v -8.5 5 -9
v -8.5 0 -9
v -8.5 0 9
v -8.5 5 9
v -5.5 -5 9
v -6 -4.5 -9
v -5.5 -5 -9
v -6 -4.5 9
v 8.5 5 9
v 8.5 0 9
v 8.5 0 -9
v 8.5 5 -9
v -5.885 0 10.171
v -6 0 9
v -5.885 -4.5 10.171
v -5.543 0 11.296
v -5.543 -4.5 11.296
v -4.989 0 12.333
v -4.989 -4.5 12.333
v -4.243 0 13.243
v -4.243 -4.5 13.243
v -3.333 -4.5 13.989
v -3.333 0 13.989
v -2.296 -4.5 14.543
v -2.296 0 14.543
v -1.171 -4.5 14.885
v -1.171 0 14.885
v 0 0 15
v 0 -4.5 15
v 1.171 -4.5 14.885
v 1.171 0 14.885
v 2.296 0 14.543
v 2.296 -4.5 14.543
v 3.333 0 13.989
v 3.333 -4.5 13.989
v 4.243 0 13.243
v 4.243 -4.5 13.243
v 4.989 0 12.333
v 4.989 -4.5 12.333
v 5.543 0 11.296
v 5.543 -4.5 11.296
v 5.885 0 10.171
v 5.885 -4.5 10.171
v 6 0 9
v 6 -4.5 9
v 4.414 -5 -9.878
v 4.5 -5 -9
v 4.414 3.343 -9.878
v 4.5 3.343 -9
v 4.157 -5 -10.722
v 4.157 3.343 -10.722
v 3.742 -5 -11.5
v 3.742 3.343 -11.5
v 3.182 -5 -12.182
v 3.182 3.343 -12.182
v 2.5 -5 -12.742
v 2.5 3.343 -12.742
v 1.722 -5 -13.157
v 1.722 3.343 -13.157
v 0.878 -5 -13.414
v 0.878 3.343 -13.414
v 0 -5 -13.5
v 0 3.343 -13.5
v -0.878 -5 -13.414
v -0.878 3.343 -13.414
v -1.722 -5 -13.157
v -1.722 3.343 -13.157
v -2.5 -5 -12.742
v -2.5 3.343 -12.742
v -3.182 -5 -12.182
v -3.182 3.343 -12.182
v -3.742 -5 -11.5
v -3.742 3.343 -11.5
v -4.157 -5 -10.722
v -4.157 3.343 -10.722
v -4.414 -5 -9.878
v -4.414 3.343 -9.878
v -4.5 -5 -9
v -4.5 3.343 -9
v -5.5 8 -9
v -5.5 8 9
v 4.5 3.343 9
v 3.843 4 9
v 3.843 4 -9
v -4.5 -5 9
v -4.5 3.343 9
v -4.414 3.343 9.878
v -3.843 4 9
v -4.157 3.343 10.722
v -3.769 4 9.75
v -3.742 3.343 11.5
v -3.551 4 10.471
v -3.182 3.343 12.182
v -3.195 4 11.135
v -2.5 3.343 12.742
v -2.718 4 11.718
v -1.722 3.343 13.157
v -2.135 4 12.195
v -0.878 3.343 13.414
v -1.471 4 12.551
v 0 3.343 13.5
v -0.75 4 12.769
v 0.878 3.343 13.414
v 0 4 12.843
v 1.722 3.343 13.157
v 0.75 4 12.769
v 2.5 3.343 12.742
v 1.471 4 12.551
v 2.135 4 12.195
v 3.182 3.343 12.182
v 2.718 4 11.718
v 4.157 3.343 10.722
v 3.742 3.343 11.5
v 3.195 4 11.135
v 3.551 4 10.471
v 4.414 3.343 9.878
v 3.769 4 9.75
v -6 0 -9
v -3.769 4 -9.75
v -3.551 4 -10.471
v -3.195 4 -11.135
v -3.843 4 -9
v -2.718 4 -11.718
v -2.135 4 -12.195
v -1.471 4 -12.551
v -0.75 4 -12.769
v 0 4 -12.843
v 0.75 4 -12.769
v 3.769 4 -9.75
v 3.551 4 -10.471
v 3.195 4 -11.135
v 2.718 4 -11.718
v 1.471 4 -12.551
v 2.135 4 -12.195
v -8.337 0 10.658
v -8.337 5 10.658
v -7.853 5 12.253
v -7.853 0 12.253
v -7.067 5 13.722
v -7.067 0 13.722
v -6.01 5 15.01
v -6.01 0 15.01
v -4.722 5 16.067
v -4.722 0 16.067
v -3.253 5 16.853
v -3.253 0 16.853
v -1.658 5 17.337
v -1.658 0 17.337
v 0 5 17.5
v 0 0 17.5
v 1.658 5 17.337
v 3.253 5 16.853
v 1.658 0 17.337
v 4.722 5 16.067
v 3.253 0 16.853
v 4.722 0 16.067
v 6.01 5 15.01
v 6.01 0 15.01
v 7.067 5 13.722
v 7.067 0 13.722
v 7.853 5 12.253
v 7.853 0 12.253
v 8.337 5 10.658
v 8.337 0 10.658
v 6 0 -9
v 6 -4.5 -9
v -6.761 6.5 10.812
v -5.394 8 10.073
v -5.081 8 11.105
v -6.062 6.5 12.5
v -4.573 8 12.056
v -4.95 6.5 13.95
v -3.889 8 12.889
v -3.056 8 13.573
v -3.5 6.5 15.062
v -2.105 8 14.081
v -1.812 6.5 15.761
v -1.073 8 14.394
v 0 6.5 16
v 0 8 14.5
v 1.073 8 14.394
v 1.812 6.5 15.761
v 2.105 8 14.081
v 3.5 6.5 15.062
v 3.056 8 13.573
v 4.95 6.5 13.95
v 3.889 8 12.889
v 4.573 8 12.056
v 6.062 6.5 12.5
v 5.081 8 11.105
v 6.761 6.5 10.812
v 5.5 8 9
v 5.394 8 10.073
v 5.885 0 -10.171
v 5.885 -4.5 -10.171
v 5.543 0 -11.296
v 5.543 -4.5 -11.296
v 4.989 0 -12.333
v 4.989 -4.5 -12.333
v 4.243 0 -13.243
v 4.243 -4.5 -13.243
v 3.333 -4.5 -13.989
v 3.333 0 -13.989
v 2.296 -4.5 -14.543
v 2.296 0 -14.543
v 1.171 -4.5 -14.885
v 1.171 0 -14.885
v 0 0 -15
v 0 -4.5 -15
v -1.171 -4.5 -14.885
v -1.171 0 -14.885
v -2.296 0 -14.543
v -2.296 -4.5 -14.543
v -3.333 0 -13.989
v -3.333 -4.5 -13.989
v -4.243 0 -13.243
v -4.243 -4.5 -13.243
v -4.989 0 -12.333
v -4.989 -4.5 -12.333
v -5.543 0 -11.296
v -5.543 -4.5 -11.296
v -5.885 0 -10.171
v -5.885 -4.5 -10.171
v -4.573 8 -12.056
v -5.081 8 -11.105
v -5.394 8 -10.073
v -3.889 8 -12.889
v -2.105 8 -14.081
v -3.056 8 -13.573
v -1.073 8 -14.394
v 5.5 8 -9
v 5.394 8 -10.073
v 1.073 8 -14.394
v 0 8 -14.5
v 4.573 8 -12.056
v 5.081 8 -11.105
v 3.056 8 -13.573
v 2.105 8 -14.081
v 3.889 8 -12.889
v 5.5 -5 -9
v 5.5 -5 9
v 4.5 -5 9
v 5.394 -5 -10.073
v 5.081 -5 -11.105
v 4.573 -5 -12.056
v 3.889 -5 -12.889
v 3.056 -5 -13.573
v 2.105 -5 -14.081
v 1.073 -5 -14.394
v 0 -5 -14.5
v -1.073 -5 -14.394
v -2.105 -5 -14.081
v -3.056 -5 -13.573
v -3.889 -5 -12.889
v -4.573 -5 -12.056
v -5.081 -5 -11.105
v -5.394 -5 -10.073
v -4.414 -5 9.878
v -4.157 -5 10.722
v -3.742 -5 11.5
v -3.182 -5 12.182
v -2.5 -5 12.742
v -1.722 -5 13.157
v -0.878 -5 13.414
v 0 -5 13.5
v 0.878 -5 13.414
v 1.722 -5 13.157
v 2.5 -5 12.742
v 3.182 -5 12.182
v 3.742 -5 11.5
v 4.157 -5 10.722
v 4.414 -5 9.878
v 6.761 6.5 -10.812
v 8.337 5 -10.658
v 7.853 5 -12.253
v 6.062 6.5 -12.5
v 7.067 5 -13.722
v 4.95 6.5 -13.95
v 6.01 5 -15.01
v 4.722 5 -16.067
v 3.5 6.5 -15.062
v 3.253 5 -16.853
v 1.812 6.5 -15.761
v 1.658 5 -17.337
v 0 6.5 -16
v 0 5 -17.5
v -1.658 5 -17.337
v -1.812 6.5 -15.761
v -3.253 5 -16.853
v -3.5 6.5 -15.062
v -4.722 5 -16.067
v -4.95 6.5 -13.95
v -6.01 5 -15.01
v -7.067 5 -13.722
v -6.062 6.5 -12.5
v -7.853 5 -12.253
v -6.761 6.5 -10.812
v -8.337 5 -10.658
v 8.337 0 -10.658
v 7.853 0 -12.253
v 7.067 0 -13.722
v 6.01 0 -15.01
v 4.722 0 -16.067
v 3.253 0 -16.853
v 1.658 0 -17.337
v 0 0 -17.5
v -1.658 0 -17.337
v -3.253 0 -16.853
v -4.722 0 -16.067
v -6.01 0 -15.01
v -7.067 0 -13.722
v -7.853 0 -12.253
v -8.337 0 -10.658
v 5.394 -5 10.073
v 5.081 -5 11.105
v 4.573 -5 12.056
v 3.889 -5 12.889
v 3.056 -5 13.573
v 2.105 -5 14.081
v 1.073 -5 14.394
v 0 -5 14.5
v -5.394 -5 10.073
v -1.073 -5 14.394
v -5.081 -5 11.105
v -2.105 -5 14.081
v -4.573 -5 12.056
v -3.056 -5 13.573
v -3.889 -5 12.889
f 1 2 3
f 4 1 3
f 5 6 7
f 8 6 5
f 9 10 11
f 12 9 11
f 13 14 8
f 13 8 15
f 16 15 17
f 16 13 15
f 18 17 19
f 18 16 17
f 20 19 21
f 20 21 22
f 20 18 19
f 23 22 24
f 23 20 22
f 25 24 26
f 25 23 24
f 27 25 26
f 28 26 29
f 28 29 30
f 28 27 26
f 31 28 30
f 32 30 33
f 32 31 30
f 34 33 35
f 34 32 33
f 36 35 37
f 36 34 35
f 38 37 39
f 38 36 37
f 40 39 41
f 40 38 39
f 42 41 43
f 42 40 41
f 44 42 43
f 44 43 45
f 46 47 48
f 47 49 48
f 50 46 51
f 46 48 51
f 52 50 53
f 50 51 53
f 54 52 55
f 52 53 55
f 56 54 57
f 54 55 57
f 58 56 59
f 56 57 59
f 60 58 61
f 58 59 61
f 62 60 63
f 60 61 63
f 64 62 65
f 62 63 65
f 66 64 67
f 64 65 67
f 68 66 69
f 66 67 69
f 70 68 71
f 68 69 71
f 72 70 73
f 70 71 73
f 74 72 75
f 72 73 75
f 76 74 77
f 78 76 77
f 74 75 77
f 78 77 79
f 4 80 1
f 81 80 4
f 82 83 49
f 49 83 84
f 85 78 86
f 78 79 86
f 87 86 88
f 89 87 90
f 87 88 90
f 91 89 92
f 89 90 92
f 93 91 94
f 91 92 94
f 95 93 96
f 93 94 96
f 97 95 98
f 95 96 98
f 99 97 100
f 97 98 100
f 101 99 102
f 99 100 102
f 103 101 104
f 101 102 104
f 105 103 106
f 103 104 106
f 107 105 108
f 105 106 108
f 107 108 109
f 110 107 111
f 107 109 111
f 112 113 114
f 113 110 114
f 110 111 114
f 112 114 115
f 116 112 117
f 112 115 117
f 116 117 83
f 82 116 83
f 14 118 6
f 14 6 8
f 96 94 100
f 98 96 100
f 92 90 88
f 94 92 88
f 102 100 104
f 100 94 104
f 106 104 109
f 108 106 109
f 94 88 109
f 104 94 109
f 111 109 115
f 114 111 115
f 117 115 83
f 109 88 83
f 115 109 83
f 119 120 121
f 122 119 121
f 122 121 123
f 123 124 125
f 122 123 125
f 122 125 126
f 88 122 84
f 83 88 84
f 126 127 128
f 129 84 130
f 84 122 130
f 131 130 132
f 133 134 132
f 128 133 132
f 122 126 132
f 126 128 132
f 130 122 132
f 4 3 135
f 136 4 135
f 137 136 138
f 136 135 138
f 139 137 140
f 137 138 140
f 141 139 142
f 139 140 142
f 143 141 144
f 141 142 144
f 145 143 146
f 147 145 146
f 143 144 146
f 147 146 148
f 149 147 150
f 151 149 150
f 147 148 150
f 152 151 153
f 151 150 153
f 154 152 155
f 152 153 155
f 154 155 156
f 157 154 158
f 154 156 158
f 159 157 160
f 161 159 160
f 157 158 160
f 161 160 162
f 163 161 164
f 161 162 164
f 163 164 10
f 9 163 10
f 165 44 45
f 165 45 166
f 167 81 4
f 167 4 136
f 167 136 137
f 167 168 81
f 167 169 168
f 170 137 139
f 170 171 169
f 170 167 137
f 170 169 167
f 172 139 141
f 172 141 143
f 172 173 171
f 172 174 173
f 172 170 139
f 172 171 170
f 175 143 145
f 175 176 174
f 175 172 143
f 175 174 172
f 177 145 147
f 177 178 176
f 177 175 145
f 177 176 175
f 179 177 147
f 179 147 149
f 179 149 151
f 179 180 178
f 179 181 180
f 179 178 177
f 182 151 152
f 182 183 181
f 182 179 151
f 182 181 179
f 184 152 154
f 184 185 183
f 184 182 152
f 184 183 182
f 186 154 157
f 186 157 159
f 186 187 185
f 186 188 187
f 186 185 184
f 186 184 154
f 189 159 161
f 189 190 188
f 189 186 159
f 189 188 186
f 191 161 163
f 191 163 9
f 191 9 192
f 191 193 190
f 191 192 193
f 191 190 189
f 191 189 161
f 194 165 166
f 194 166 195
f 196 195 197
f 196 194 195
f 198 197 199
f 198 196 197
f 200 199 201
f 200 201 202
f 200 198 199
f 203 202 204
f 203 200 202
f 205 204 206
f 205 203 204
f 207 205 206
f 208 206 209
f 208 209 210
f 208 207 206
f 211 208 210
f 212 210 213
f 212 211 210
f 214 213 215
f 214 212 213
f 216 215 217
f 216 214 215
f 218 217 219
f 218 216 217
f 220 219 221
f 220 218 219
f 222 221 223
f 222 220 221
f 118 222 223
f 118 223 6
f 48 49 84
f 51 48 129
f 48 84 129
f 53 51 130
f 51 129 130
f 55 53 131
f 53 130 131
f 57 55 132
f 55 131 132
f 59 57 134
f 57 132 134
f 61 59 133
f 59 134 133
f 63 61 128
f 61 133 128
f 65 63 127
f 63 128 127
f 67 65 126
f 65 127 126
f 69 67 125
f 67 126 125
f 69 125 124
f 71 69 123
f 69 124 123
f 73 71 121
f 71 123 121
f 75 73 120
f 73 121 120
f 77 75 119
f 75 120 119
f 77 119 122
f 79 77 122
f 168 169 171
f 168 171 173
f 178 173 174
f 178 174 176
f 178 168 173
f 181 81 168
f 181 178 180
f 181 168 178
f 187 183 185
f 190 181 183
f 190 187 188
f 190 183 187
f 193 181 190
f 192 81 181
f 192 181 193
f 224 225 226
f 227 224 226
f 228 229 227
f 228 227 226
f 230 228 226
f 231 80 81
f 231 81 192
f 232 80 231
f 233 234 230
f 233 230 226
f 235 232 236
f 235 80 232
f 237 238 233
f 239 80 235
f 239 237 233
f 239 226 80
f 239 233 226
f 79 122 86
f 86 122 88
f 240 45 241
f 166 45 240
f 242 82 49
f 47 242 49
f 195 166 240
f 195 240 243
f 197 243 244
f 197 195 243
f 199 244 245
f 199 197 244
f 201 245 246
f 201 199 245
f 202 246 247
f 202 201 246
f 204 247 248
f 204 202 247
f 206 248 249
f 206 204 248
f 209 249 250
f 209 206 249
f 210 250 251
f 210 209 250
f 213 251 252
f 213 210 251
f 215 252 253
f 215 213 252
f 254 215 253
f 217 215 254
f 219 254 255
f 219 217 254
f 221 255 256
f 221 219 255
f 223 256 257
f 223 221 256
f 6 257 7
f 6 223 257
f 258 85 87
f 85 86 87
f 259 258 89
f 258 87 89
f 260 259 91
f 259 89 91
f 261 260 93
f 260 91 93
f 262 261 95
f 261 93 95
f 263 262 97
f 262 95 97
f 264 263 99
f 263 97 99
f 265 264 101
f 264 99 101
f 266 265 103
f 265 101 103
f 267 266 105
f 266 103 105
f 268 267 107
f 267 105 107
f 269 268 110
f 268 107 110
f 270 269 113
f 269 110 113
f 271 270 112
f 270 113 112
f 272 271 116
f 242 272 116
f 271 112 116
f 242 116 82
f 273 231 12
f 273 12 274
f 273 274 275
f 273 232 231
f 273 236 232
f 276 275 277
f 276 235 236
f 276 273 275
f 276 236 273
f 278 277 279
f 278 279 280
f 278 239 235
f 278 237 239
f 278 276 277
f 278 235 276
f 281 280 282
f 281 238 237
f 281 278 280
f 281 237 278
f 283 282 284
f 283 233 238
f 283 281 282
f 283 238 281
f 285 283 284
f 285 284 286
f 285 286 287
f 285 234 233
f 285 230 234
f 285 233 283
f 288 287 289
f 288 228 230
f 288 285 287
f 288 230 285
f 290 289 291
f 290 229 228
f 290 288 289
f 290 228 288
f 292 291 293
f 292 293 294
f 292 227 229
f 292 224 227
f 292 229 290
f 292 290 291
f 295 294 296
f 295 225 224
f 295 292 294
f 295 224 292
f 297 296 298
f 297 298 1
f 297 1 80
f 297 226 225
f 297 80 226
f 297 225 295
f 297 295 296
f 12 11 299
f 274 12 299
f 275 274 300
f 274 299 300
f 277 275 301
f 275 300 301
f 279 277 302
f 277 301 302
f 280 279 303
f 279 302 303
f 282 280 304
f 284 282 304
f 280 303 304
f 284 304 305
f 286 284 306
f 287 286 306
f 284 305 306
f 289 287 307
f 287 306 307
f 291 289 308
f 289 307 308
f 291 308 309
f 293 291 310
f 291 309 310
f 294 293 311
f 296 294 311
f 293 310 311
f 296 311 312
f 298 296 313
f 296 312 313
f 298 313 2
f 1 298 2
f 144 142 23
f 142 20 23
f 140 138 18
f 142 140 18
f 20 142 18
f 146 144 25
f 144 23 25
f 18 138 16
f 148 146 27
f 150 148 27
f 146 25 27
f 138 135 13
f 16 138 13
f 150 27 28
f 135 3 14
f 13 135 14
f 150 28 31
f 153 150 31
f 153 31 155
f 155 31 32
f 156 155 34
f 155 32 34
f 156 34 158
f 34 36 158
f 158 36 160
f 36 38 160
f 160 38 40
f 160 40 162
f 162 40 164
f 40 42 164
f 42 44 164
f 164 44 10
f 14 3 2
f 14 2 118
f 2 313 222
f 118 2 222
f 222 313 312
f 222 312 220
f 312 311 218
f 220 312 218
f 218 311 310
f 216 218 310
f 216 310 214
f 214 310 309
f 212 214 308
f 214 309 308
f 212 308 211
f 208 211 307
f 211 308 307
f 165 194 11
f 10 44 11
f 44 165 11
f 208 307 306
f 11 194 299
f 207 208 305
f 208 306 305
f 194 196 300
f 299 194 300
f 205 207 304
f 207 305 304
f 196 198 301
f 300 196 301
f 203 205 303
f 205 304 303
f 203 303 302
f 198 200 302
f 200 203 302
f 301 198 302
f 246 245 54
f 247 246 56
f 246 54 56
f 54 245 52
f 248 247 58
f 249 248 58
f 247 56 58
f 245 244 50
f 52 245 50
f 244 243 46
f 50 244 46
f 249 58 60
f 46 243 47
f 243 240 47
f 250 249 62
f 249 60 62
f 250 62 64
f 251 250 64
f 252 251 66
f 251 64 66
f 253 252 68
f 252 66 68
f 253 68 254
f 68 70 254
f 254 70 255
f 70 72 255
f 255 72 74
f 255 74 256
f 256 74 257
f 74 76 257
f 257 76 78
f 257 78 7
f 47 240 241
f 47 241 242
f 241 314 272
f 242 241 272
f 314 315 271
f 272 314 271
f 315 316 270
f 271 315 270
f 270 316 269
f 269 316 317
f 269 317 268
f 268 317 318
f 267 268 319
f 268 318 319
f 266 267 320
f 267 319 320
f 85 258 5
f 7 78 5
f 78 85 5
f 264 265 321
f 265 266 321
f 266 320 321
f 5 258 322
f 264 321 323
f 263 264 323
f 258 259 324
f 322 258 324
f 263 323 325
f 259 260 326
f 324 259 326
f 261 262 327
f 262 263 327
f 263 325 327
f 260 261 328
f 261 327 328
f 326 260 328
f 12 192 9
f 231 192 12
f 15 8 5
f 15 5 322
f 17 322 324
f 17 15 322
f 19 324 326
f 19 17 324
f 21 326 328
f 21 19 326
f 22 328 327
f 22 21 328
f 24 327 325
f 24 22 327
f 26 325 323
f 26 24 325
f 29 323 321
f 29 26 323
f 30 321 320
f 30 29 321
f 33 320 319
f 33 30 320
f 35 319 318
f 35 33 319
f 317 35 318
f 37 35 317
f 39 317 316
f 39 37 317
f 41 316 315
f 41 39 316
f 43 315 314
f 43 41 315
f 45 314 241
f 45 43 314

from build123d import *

# Parameters (mm, degrees)
EXTRUSION1_DEPTH = 8
CHANFREIN1_SIZE  = 3
COQUE1_T         = -4
EXTRUSION2_DEPTH = 5
CHANFREIN2_SIZE  = 0.5


with BuildPart() as part:
    # Esquisse1 → Extrusion1 (new body)
    with BuildSketch(Plane(origin=(0, 0, 0), x_dir=(1, 0, 0), z_dir=(0, 1, 0))):
        with BuildLine():
            Line((-8.5, 9), (-8.5, -9))
            ThreePointArc((-8.5, -9), (0, -17.5), (8.5, -9))
            Line((8.5, -9), (8.5, 9))
            ThreePointArc((8.5, 9), (0, 17.5), (-8.5, 9))
        make_face()
    extrude(amount=EXTRUSION1_DEPTH)

    # Chanfrein1
    chanfrein1_edges = [part.edges().sort_by_distance(p)[0] for p in [
        (0, 8, 17.5),
        (8.5, 8, 0),
        (0, 8, -17.5),
        (-8.5, 8, 0),
    ]]
    chamfer(chanfrein1_edges, length=CHANFREIN1_SIZE)

    # Coque1
    coque1_openings = [part.faces().sort_by_distance(p)[0] for p in [
        (0, 0, 0),
    ]]
    offset(amount=COQUE1_T, openings=coque1_openings, kind=Kind.INTERSECTION)

    # Esquisse2 → Extrusion2 (add)
    with BuildSketch(Plane.XZ):
        with BuildLine():
            Line((-6, -9), (-6, 9))
            ThreePointArc((-6, 9), (0, 15), (6, 9))
            Line((6, 9), (6, -9))
            ThreePointArc((6, -9), (0, -15), (-6, -9))
        make_face()
        with BuildLine():
            Line((4.5, 9), (4.5, -9))
            ThreePointArc((4.5, -9), (0, -13.5), (-4.5, -9))
            Line((-4.5, -9), (-4.5, 9))
            ThreePointArc((-4.5, 9), (0, 13.5), (4.5, 9))
        make_face(mode=Mode.SUBTRACT)
    extrude(amount=EXTRUSION2_DEPTH)

    # Chanfrein2
    chanfrein2_edges = [part.edges().sort_by_distance(p)[0] for p in [
        (0, -5, -15),
        (6, -5, 0),
        (0, -5, 15),
        (-6, -5, 0),
    ]]
    chamfer(chanfrein2_edges, length=CHANFREIN2_SIZE)


solid = part.part
